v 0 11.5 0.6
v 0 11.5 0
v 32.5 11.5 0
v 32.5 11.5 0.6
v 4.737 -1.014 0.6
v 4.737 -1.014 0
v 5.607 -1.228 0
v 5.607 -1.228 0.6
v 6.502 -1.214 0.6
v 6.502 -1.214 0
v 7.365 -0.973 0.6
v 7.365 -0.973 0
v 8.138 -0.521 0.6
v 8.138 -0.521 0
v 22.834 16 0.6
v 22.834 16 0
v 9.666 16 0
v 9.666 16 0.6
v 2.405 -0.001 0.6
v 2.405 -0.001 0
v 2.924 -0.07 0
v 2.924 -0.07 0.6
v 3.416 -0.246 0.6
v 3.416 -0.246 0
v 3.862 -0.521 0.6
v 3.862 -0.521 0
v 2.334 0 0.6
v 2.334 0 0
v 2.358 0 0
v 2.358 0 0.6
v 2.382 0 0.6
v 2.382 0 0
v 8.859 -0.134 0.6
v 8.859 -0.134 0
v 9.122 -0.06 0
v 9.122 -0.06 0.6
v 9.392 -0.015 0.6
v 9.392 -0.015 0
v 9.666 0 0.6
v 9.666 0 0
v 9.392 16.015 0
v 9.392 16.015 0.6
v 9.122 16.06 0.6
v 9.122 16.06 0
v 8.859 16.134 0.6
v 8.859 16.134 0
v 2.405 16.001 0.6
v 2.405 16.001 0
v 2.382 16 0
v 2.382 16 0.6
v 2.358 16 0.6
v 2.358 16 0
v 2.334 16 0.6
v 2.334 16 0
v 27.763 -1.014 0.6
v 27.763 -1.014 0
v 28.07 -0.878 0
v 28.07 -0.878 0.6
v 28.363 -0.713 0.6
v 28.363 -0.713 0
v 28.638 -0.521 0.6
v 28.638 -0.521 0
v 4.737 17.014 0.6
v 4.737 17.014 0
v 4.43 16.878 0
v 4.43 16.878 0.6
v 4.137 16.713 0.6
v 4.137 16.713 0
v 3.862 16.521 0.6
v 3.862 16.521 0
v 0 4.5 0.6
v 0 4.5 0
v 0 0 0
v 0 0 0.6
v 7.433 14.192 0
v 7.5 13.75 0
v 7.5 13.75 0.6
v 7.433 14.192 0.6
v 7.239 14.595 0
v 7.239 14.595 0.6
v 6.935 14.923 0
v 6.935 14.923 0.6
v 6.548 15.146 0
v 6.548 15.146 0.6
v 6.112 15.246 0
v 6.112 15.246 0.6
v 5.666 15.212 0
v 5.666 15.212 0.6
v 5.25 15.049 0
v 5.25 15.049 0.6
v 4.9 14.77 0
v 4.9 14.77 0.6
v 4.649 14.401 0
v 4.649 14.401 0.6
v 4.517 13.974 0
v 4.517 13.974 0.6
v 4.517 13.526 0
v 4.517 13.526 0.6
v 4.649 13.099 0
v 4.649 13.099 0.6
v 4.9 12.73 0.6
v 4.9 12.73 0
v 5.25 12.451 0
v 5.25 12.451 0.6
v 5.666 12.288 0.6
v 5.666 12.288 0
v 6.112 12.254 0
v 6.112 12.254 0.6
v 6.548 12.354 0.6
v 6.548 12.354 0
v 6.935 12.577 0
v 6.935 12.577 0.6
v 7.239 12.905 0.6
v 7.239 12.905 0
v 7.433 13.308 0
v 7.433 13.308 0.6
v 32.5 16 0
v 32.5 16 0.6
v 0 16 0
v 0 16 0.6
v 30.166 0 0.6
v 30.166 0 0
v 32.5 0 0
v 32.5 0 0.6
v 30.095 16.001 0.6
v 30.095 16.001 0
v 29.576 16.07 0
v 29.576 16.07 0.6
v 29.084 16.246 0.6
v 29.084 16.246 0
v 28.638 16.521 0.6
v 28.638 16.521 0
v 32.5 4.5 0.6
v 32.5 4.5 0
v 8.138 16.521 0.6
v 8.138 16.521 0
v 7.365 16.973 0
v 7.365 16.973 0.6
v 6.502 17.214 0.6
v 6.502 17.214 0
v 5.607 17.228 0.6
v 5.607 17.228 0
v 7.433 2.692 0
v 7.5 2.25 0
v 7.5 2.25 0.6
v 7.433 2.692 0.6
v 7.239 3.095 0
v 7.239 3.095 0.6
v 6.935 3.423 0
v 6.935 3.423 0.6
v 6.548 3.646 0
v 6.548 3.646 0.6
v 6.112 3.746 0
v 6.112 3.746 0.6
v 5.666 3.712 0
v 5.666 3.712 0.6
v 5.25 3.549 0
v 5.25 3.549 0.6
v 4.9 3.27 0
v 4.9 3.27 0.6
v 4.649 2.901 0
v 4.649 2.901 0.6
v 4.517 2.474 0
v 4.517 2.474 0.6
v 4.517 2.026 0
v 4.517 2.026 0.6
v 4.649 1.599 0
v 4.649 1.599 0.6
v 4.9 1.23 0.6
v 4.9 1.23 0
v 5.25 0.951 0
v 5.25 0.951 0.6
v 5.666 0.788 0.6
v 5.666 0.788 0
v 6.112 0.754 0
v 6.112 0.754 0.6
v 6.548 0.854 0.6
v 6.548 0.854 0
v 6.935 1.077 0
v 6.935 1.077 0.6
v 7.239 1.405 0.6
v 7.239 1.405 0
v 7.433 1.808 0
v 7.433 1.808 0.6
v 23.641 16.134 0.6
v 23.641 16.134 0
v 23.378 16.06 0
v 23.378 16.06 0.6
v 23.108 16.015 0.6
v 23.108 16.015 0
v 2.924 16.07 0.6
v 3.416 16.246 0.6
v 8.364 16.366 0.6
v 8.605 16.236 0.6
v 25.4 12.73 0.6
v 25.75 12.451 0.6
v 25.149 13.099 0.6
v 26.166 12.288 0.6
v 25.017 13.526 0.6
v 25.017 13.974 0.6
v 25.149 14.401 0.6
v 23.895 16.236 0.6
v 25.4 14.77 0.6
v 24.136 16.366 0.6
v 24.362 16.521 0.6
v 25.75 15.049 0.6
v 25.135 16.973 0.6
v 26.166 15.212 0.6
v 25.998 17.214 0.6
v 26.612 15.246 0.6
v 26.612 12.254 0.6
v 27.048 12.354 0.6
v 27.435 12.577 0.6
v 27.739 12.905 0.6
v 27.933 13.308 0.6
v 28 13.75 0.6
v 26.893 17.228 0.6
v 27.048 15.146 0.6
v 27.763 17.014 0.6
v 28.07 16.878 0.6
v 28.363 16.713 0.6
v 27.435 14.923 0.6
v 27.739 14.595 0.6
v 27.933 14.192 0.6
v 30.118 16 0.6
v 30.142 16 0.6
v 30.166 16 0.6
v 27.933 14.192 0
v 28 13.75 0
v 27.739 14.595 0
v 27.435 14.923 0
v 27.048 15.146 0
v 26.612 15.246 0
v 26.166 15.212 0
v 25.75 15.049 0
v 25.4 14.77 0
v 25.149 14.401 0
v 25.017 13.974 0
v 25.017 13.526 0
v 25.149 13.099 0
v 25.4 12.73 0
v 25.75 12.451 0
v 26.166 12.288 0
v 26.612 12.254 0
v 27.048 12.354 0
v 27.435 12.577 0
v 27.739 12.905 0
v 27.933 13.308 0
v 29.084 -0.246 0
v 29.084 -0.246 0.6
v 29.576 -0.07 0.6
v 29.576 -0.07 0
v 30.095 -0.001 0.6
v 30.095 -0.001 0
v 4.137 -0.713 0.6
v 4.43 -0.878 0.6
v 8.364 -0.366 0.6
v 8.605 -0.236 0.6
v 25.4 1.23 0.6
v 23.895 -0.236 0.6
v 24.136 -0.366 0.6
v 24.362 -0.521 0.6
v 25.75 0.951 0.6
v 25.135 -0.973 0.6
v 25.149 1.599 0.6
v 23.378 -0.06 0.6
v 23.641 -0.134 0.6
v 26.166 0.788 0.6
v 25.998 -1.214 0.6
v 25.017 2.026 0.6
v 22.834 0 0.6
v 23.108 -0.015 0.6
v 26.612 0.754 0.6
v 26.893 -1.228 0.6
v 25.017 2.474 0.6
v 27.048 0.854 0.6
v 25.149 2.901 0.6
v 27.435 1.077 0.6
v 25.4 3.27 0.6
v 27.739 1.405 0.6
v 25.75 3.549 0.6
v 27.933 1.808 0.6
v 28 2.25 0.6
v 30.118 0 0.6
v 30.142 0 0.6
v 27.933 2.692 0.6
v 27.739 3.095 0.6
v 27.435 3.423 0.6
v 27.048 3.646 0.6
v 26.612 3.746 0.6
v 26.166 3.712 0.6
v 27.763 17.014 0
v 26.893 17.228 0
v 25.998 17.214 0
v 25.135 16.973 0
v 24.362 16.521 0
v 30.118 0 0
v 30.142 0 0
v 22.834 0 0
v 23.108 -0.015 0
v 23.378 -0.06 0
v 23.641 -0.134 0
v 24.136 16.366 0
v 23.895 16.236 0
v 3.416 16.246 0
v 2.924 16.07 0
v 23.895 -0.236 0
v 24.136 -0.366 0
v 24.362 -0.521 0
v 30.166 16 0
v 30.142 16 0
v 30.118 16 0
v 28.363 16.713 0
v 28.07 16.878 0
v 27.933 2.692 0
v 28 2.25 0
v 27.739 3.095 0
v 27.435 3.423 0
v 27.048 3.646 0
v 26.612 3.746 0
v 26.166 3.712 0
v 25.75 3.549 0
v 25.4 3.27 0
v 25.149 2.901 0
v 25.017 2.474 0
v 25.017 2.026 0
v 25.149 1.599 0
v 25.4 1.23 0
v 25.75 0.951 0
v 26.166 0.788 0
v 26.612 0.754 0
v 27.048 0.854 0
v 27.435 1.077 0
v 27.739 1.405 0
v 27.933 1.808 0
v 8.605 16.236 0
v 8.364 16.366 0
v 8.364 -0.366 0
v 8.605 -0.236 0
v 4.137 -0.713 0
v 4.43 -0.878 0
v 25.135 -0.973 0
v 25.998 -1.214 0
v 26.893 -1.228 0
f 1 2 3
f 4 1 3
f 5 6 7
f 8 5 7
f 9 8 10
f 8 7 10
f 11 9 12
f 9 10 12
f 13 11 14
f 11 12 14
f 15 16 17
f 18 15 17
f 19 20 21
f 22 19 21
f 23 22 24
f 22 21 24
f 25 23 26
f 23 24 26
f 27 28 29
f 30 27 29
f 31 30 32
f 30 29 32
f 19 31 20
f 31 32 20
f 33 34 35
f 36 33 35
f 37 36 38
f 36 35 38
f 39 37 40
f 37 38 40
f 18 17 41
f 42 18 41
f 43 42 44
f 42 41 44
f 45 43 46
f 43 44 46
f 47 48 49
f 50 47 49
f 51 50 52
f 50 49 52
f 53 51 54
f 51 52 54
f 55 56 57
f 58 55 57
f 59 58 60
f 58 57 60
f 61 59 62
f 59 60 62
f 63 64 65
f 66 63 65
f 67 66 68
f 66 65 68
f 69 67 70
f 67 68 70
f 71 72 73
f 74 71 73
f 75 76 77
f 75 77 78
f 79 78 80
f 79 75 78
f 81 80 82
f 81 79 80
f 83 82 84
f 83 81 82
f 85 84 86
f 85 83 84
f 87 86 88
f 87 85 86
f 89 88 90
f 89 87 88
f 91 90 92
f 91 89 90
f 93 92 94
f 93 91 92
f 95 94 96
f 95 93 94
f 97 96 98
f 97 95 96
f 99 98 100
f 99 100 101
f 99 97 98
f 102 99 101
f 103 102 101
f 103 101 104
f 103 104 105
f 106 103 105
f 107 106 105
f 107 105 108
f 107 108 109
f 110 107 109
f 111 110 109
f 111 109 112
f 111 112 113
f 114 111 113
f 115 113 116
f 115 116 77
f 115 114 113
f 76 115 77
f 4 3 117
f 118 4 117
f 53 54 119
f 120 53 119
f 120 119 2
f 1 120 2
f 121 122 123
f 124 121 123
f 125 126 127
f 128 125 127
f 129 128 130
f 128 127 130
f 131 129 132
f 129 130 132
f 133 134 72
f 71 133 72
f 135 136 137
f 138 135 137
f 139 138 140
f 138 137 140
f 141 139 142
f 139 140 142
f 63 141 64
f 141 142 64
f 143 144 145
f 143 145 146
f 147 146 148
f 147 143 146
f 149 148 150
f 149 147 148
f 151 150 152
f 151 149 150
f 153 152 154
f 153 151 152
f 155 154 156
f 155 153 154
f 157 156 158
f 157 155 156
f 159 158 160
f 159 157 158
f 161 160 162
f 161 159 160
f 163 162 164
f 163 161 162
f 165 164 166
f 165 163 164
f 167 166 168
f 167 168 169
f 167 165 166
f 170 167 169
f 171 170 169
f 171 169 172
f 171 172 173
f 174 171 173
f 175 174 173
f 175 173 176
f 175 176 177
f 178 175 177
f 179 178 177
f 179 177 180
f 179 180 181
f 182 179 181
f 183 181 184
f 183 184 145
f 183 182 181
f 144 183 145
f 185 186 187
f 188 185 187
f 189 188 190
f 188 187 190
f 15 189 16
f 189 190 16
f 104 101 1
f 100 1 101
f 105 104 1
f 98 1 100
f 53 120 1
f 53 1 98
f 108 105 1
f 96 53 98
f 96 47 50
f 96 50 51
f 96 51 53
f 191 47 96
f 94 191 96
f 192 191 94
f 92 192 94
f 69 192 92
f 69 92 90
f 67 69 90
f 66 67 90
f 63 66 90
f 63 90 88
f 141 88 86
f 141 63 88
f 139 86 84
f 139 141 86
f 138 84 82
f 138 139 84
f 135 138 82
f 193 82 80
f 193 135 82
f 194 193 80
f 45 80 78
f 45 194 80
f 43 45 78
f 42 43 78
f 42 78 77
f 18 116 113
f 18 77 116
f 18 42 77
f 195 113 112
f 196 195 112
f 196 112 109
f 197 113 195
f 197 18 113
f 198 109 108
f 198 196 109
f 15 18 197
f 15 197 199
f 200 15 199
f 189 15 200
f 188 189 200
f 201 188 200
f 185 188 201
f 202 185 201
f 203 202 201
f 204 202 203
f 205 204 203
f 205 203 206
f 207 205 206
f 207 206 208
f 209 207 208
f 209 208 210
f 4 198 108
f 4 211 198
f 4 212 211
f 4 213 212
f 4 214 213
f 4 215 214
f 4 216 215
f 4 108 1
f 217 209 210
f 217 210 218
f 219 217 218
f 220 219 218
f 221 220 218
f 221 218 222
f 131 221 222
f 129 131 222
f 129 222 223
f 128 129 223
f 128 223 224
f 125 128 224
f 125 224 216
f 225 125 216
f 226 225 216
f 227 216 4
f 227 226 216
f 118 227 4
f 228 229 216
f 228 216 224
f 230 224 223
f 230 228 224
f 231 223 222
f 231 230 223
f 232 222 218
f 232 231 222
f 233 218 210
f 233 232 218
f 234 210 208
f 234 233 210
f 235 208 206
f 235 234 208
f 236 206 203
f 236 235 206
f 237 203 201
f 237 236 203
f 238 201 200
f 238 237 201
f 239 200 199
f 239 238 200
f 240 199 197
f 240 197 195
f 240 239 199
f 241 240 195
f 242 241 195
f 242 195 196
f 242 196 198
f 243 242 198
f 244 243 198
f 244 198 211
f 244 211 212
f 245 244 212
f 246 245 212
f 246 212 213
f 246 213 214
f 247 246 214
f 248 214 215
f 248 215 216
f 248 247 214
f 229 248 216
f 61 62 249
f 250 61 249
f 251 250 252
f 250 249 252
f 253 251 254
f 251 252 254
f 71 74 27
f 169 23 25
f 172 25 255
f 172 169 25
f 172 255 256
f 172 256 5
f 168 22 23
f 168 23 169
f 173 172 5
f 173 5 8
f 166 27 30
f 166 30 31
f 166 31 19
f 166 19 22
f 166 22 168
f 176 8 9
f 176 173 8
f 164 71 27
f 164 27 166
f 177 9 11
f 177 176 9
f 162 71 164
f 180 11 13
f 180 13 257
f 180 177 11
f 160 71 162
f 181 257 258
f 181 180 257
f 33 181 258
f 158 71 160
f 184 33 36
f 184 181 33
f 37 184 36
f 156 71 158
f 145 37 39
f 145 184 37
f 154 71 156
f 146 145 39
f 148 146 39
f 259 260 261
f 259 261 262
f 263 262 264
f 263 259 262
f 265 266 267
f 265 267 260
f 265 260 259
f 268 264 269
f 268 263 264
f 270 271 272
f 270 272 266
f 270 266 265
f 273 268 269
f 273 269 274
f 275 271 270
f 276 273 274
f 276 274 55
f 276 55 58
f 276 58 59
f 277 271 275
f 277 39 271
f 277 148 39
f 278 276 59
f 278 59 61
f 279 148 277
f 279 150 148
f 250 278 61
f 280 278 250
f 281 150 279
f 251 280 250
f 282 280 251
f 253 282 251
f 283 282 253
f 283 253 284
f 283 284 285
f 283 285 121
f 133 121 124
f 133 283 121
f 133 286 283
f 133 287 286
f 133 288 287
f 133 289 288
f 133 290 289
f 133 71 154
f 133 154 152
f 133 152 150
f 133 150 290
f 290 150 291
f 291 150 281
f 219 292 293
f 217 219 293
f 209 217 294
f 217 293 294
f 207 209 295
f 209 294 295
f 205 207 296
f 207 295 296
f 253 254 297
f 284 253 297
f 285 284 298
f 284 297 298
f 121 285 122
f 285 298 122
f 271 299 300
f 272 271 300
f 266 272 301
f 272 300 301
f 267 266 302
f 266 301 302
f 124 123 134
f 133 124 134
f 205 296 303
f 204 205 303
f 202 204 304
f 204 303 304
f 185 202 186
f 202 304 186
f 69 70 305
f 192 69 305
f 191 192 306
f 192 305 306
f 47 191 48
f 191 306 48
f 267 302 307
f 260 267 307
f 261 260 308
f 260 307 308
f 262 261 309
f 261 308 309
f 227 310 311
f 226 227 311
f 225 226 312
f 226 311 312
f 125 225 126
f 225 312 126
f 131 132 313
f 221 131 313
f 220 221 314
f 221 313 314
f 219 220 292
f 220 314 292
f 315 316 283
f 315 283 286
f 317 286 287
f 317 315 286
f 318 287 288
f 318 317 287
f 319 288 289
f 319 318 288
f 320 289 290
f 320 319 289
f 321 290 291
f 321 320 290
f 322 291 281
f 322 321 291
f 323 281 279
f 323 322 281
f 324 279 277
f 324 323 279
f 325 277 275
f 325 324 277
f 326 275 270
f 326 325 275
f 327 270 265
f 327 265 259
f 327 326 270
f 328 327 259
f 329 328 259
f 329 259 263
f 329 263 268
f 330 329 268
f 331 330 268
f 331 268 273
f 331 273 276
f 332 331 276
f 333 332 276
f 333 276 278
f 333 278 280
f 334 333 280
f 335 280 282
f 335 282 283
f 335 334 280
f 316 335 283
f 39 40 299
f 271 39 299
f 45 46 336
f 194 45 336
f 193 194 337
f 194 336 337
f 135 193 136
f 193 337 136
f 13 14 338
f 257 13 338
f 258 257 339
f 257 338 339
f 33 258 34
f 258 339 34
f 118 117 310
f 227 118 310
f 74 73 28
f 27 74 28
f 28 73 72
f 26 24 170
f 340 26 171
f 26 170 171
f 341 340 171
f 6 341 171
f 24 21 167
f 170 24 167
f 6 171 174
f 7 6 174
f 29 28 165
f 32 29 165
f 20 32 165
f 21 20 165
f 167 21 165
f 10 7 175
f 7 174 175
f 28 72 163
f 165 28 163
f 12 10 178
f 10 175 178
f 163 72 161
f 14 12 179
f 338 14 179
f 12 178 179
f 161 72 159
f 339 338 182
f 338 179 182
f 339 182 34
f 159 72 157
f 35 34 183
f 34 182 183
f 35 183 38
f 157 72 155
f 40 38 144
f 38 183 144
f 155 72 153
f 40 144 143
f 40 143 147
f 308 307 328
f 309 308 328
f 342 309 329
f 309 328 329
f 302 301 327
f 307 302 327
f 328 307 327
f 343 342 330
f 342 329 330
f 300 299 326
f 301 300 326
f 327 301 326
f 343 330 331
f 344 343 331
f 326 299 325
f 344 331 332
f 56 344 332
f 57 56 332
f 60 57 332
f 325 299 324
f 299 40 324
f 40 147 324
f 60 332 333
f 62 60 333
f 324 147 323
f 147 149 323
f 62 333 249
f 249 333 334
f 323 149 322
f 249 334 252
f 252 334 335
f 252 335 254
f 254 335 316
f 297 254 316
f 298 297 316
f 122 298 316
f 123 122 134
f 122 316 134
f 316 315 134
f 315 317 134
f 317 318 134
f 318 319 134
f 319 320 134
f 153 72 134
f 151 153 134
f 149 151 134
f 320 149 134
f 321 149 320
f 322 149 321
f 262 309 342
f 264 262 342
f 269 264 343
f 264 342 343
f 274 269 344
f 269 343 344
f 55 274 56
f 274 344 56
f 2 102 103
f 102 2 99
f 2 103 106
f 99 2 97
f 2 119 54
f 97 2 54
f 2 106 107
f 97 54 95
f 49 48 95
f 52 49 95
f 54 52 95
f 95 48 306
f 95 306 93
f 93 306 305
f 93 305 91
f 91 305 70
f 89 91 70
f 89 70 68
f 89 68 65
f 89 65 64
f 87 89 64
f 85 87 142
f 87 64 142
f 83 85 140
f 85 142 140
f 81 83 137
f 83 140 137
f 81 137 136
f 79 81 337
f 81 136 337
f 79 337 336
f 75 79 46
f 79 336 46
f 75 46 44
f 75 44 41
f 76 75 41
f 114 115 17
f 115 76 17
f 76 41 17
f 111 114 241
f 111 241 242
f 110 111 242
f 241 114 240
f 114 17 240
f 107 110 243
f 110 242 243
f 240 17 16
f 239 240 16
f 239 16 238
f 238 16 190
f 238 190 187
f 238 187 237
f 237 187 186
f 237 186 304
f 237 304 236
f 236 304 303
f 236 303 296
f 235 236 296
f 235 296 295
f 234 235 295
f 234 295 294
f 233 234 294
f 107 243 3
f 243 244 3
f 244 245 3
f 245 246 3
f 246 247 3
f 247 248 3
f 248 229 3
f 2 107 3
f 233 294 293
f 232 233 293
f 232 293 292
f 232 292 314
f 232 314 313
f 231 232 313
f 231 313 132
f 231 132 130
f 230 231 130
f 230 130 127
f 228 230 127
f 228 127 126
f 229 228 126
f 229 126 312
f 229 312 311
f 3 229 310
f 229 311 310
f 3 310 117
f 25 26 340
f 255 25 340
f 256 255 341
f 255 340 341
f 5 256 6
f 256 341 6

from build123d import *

# Parameters (mm, degrees)
SKETCH1_R           = 1.5
BOSS_EXTRUDE1_DEPTH = 0.6


with BuildPart() as part:
    # Sketch1 → Boss-Extrude1 (new body)
    with BuildSketch(Plane(origin=(0, 14.6, 0), x_dir=(1, 0, 0), z_dir=(0, 0, 1))):
        with BuildLine():
            Line((0, 1.4), (0, -3.1))
            Line((0, -3.1), (16.250000005, -3.1))
            Line((16.250000005, -3.1), (16.250000005, 1.4))
            Line((16.250000005, 1.4), (9.665719575, 1.4))
            ThreePointArc((9.665719575, 1.4), (9.256775524, 1.433673833), (8.858848044, 1.533788189))
            ThreePointArc((8.858848044, 1.533788189), (8.48265693, 1.697646082), (8.138336419, 1.920833333))
            ThreePointArc((8.138336419, 1.920833333), (6.502278947, 2.613771912), (4.736783251, 2.414089987))
            ThreePointArc((4.736783251, 2.414089987), (4.28143475, 2.199021725), (3.861663581, 1.920833333))
            ThreePointArc((3.861663581, 1.920833333), (3.174687447, 1.545490277), (2.405308582, 1.401009204))
            ThreePointArc((2.405308582, 1.401009204), (2.369798088, 1.400252314), (2.334280425, 1.4))
            Line((2.334280425, 1.4), (0, 1.4))
        make_face()
        with Locations((6, -0.85)):
            Circle(SKETCH1_R, mode=Mode.SUBTRACT)
        with BuildLine():
            Line((16.250000005, -10.1), (0, -10.1))
            Line((0, -10.1), (0, -14.6))
            Line((0, -14.6), (2.334280425, -14.6))
            ThreePointArc((2.334280425, -14.6), (2.369798088, -14.600252314), (2.405308582, -14.601009204))
            ThreePointArc((2.405308582, -14.601009204), (3.174687447, -14.745490277), (3.861663581, -15.120833333))
            ThreePointArc((3.861663581, -15.120833333), (4.28143475, -15.399021725), (4.736783251, -15.614089987))
            ThreePointArc((4.736783251, -15.614089987), (6.502278947, -15.813771912), (8.138336419, -15.120833333))
            ThreePointArc((8.138336419, -15.120833333), (8.48265693, -14.897646082), (8.858848044, -14.733788189))
            ThreePointArc((8.858848044, -14.733788189), (9.256775524, -14.633673833), (9.665719575, -14.6))
            Line((9.665719575, -14.6), (16.250000005, -14.6))
            Line((16.250000005, -14.6), (16.250000005, -10.1))
        make_face()
        with Locations((6, -12.35)):
            Circle(SKETCH1_R, mode=Mode.SUBTRACT)
        with BuildLine():
            Line((16.250000005, 1.4), (16.250000005, -3.1))
            Line((16.250000005, -3.1), (32.500000009, -3.1))
            Line((32.500000009, -3.1), (32.500000009, 1.4))
            Line((32.500000009, 1.4), (30.165719584, 1.4))
            ThreePointArc((30.165719584, 1.4), (30.130201921, 1.400252314), (30.094691427, 1.401009204))
            ThreePointArc((30.094691427, 1.401009204), (29.325312562, 1.545490277), (28.638336428, 1.920833333))
            ThreePointArc((28.638336428, 1.920833333), (28.21856526, 2.199021725), (27.763216759, 2.414089987))
            ThreePointArc((27.763216759, 2.414089987), (25.997721062, 2.613771912), (24.361663591, 1.920833333))
            ThreePointArc((24.361663591, 1.920833333), (24.017343079, 1.697646082), (23.641151965, 1.533788189))
            ThreePointArc((23.641151965, 1.533788189), (23.243224485, 1.433673833), (22.834280435, 1.4))
            Line((22.834280435, 1.4), (16.250000005, 1.4))
        make_face()
        with Locations((26.500000009, -0.85)):
            Circle(SKETCH1_R, mode=Mode.SUBTRACT)
        with BuildLine():
            Line((32.500000009, -10.1), (16.250000005, -10.1))
            Line((16.250000005, -10.1), (16.250000005, -14.6))
            Line((16.250000005, -14.6), (22.834280435, -14.6))
            ThreePointArc((22.834280435, -14.6), (23.243224485, -14.633673833), (23.641151965, -14.733788189))
            ThreePointArc((23.641151965, -14.733788189), (24.017343079, -14.897646082), (24.361663591, -15.120833333))
            ThreePointArc((24.361663591, -15.120833333), (25.997721062, -15.813771912), (27.763216759, -15.614089987))
            ThreePointArc((27.763216759, -15.614089987), (28.21856526, -15.399021725), (28.638336428, -15.120833333))
            ThreePointArc((28.638336428, -15.120833333), (29.325312562, -14.745490277), (30.094691427, -14.601009204))
            ThreePointArc((30.094691427, -14.601009204), (30.130201921, -14.600252314), (30.165719584, -14.6))
            Line((30.165719584, -14.6), (32.500000009, -14.6))
            Line((32.500000009, -14.6), (32.500000009, -10.1))
        make_face()
        with Locations((26.500000009, -12.35)):
            Circle(SKETCH1_R, mode=Mode.SUBTRACT)
    extrude(amount=BOSS_EXTRUDE1_DEPTH)


solid = part.part
